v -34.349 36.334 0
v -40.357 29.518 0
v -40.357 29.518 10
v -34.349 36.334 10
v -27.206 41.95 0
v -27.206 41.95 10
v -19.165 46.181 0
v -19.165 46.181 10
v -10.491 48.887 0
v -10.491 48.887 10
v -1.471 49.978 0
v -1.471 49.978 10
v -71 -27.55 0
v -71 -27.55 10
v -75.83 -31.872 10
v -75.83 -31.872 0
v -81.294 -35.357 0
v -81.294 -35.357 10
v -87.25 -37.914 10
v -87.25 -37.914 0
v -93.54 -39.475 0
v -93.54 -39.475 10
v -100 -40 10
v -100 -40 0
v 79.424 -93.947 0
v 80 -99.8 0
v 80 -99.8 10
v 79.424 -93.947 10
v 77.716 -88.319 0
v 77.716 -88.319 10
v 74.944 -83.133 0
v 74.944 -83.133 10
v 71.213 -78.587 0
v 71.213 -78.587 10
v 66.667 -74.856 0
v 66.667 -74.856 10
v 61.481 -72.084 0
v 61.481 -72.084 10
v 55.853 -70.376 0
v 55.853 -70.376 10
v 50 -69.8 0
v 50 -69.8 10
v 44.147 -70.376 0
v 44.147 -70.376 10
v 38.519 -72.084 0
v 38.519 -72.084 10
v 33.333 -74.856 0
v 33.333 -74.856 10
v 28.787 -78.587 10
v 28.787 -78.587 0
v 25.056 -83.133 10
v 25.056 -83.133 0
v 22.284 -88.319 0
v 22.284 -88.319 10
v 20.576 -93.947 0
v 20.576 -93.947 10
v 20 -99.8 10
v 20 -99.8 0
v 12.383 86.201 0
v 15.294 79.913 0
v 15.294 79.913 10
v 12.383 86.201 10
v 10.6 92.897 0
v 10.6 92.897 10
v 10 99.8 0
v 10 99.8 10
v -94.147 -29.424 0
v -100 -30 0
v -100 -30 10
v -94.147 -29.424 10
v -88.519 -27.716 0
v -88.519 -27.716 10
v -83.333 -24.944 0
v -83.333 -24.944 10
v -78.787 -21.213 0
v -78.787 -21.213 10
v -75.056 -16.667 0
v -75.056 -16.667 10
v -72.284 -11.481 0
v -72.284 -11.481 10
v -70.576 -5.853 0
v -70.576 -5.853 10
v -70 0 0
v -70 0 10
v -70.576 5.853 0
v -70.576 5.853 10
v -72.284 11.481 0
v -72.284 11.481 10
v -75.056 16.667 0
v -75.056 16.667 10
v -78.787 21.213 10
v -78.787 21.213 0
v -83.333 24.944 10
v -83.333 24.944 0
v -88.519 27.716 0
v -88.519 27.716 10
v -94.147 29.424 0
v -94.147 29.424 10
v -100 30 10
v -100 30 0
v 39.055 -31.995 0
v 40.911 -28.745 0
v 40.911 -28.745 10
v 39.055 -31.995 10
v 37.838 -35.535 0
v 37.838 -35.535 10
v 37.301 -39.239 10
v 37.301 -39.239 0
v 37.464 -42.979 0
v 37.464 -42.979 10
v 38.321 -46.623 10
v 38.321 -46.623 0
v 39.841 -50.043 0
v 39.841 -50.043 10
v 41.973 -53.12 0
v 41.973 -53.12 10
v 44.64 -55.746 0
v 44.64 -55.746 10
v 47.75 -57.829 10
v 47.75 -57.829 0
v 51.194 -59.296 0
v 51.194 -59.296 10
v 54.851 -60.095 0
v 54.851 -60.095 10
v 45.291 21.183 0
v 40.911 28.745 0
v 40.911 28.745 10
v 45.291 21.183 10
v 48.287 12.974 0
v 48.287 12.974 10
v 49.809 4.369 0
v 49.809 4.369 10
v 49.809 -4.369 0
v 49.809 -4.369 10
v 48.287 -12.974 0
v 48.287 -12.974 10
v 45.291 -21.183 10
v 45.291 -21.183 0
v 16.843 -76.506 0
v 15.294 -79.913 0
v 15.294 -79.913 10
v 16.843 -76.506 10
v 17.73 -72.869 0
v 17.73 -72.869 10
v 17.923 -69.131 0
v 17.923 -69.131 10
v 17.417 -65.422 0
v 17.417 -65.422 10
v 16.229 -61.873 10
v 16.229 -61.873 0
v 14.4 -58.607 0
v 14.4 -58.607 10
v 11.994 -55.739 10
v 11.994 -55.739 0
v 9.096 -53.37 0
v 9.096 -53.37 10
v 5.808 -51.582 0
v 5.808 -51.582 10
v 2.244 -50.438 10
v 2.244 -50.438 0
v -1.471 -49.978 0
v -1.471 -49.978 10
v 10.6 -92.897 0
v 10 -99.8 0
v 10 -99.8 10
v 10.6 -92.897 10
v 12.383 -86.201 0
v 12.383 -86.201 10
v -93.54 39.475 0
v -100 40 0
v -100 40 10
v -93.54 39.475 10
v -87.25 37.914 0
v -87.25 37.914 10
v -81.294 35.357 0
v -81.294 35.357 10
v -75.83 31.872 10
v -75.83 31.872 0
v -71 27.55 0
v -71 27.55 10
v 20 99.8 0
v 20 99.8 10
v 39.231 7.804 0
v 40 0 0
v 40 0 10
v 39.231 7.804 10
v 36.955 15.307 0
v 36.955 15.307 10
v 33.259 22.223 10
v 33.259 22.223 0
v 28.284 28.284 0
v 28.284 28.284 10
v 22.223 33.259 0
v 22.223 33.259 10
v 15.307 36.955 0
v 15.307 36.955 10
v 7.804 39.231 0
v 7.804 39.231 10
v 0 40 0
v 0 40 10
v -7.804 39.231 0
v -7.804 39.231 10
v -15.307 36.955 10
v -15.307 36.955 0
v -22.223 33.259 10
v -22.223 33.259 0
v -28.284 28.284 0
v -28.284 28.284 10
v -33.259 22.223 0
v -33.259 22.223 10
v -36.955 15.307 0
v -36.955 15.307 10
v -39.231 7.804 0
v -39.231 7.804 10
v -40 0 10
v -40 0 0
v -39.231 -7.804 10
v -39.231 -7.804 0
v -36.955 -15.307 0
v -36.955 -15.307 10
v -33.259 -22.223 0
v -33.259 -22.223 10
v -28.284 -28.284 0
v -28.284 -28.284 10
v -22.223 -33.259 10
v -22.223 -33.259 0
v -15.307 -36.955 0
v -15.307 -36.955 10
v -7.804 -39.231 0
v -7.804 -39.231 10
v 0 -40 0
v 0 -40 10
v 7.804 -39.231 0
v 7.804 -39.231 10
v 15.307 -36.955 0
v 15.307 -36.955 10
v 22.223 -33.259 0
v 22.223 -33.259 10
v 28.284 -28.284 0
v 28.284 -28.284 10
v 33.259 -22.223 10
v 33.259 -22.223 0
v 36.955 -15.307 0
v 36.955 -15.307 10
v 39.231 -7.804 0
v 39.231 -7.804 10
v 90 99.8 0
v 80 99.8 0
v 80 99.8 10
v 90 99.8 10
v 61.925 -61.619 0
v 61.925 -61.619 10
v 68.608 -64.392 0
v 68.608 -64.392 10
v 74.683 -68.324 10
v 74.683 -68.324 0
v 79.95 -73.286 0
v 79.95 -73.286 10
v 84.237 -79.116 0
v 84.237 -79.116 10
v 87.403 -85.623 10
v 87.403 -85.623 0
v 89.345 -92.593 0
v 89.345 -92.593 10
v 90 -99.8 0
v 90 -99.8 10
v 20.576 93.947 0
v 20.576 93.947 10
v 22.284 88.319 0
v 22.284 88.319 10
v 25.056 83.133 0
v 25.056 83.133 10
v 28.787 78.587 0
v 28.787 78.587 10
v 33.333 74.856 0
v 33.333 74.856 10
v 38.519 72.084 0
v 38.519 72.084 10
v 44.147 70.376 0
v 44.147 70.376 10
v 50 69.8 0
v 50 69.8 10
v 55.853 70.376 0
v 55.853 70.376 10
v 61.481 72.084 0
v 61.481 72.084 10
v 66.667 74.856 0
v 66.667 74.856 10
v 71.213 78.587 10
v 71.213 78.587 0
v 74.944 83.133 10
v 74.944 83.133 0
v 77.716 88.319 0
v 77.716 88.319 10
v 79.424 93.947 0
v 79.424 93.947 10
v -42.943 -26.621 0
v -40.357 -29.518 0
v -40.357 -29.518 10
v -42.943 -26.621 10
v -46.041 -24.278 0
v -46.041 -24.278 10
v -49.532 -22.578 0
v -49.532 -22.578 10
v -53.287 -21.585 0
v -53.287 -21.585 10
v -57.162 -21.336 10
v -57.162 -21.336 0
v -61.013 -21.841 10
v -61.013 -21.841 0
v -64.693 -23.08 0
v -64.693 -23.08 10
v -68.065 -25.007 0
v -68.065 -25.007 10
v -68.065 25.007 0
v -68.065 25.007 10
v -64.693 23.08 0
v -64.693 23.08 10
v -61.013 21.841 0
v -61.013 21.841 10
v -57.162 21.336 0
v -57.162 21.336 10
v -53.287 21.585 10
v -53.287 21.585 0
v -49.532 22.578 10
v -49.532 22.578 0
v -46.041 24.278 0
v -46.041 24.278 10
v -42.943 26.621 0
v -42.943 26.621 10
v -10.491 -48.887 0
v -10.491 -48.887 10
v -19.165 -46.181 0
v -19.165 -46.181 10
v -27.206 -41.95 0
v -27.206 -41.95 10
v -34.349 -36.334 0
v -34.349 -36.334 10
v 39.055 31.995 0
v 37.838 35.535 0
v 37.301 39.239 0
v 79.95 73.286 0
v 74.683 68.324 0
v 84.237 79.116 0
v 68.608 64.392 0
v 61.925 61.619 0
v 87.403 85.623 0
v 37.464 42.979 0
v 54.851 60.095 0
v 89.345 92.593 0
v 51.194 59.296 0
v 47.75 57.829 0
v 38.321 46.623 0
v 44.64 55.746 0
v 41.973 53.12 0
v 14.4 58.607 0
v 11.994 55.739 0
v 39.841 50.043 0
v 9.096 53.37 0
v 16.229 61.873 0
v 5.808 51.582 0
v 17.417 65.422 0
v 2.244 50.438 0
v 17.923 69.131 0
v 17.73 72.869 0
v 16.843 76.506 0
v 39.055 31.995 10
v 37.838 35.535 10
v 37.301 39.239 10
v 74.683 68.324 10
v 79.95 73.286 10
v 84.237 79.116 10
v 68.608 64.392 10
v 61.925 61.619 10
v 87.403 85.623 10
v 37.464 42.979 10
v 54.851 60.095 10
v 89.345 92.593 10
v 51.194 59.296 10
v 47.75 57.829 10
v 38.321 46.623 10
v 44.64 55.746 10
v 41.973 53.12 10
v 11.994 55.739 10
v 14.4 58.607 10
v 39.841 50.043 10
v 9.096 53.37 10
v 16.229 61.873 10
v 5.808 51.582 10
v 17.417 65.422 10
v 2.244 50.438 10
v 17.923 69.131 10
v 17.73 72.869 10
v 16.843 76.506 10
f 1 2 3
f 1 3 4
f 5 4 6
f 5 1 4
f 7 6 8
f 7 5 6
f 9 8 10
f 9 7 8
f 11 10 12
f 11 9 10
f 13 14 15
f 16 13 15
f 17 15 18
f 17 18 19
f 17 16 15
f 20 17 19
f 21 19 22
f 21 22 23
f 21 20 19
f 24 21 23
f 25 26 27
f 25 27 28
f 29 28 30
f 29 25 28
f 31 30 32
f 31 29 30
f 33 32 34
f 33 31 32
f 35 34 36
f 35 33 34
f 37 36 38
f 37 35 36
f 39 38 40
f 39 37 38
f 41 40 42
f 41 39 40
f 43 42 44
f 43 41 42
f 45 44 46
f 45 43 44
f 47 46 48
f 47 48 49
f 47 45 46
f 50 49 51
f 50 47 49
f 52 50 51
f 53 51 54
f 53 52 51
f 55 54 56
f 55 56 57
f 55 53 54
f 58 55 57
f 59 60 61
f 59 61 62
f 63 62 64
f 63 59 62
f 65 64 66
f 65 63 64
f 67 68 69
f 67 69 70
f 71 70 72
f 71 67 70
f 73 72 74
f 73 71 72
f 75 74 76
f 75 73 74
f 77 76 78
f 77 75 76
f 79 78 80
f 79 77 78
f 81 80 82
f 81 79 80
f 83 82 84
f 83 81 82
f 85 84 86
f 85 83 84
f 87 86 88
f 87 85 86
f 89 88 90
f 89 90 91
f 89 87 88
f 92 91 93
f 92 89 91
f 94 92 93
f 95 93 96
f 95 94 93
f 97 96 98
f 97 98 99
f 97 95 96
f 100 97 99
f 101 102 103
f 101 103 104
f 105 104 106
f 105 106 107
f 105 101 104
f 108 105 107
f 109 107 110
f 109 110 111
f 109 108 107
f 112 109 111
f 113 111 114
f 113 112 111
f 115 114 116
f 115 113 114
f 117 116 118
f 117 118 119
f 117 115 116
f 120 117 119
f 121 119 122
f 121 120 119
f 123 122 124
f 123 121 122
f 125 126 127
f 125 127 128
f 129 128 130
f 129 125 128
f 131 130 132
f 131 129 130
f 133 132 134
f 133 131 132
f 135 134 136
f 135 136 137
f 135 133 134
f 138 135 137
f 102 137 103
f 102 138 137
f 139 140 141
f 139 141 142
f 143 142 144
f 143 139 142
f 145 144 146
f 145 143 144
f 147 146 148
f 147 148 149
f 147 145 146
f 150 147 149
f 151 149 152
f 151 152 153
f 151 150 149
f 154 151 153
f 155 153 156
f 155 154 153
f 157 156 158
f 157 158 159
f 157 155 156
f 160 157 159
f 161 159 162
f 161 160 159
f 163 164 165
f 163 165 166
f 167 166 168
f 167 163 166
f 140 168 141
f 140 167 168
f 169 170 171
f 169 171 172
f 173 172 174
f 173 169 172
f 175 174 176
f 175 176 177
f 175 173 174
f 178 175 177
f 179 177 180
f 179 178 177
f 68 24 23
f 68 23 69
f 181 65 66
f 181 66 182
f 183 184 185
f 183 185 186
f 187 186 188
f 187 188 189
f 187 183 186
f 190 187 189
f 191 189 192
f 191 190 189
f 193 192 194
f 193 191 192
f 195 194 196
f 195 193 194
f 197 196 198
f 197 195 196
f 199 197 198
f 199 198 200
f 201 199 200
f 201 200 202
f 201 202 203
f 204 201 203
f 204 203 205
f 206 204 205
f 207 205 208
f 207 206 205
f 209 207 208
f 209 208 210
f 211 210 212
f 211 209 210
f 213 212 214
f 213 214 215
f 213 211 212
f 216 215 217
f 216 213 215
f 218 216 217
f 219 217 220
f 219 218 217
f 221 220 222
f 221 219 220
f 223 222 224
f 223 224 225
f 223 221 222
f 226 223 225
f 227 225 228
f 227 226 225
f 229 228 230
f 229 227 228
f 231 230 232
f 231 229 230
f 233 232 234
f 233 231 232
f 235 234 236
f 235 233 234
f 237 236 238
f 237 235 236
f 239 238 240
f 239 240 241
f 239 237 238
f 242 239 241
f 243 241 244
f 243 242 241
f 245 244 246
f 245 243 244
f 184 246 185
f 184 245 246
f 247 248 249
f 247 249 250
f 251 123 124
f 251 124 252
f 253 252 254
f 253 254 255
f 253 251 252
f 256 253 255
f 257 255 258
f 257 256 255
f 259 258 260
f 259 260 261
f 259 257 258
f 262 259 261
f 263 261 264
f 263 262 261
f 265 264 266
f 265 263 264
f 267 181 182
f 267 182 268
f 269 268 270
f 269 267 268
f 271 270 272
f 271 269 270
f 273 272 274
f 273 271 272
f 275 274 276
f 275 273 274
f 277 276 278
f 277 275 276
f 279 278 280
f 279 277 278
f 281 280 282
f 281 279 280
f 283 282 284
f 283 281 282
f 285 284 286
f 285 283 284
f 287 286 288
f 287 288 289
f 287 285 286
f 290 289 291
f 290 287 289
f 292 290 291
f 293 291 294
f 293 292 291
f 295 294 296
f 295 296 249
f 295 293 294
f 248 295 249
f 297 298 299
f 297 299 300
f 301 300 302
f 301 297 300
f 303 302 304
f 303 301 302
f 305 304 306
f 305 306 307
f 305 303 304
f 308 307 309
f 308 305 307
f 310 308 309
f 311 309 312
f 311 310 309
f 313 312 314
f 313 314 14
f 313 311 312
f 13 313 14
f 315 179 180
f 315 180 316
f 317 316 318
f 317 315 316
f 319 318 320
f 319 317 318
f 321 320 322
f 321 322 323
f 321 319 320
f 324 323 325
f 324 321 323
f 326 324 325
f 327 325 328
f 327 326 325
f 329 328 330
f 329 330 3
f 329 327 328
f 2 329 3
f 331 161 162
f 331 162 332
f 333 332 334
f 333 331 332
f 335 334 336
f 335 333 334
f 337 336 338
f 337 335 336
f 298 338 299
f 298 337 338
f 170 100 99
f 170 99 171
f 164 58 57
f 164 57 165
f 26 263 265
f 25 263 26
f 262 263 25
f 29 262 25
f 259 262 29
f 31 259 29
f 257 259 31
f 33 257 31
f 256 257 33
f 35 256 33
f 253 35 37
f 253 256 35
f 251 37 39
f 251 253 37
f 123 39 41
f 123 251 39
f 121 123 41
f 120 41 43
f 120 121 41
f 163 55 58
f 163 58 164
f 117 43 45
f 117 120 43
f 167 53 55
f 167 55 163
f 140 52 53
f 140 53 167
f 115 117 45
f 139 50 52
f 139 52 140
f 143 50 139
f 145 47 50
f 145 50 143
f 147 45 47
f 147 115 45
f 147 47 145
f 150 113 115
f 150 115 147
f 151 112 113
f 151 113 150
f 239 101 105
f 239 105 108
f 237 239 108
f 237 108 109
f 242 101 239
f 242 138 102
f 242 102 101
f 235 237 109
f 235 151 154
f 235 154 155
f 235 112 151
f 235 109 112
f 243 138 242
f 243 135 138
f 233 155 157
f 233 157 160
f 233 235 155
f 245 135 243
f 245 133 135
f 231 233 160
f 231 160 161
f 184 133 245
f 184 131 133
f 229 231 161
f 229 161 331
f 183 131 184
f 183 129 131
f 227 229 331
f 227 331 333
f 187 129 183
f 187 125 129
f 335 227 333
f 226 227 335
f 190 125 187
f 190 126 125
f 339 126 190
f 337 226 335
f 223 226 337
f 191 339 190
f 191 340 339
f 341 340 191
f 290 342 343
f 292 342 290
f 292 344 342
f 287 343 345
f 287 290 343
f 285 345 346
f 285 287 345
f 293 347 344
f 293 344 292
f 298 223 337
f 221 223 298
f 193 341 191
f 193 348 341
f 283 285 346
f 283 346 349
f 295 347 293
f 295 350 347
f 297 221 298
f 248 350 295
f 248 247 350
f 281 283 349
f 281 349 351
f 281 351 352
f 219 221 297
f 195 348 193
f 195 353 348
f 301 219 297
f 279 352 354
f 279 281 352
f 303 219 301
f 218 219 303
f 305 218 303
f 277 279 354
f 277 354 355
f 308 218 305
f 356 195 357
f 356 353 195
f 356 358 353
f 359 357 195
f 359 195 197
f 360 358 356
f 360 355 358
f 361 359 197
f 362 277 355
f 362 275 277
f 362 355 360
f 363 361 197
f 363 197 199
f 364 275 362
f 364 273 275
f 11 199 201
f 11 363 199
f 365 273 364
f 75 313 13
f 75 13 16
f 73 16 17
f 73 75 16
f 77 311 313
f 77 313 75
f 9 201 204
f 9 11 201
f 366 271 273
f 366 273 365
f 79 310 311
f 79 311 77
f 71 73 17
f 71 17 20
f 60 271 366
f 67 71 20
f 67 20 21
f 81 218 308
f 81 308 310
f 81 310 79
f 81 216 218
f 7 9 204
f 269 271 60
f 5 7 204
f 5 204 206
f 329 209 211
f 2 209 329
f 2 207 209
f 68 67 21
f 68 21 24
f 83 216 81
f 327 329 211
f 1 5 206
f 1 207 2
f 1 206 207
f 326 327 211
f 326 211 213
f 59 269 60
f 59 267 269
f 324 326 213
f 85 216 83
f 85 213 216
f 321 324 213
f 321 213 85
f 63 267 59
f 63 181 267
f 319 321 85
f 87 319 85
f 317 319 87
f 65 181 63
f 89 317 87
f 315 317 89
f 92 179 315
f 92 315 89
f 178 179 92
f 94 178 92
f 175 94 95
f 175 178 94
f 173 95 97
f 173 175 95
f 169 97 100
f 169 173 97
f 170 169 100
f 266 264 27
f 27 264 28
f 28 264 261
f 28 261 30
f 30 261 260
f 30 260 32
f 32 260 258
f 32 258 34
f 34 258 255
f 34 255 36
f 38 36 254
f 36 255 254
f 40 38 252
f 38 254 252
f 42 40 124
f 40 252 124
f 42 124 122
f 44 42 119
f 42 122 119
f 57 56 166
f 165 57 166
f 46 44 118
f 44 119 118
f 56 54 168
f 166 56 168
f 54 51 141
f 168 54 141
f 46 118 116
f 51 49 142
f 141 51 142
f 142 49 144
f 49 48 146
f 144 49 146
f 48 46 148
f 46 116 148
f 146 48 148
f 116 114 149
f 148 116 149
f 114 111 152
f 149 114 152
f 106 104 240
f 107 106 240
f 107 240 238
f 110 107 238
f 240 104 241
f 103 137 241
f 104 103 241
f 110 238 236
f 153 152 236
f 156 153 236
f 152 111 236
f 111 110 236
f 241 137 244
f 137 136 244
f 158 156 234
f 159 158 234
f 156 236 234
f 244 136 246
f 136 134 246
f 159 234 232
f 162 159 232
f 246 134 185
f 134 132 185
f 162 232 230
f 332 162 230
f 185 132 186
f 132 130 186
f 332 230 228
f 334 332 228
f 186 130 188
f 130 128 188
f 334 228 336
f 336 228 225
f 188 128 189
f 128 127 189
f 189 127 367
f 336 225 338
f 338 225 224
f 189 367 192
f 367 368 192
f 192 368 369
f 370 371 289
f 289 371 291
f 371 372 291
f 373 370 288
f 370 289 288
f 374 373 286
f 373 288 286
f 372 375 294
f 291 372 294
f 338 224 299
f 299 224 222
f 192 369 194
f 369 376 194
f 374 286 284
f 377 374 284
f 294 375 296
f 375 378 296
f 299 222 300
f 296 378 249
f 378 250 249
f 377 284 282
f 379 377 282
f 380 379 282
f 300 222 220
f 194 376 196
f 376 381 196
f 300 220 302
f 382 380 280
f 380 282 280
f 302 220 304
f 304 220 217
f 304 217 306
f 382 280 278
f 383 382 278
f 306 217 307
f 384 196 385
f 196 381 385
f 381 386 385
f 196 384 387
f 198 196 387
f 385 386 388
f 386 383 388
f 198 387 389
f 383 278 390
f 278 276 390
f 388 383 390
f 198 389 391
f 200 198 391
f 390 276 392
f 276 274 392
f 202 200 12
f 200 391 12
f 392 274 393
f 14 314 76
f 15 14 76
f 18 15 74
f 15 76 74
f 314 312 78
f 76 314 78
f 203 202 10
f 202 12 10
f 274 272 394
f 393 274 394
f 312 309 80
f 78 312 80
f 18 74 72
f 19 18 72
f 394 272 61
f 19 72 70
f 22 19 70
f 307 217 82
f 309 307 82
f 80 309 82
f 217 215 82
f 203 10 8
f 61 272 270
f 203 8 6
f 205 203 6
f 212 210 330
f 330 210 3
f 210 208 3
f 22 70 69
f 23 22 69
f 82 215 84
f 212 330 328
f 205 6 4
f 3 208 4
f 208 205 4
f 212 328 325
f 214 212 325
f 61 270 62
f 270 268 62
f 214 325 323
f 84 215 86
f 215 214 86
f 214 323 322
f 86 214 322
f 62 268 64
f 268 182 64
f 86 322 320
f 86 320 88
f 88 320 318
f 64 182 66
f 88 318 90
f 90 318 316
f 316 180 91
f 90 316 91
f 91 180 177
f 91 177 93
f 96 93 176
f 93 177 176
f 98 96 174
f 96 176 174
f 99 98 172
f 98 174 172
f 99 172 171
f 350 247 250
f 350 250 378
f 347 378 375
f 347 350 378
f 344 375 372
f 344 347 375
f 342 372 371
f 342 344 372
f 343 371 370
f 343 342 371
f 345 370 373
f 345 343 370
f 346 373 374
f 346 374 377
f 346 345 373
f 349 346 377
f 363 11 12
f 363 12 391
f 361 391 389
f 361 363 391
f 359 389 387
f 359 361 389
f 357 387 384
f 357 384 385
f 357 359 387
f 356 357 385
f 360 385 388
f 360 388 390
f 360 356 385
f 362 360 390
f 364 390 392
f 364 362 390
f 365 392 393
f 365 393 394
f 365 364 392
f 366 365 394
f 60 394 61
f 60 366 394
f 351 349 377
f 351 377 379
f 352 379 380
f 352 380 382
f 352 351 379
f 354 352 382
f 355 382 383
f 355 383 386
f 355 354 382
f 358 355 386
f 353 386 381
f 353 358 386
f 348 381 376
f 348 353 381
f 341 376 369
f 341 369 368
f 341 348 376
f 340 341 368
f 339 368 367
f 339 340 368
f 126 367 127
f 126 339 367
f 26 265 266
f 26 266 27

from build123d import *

# Parameters (mm, degrees)
SKETCH2_R           = 40
BOSS_EXTRUDE1_DEPTH = 10


with BuildPart() as part:
    # Sketch2 → Boss-Extrude1 (new body)
    with BuildSketch(Plane.XY):
        with BuildLine():
            Line((-100, -40), (-100, -30))
            ThreePointArc((-100, -30), (-70, 0), (-100, 30))
            Line((-100, 30), (-100, 40))
            ThreePointArc((-100, 40), (-84.220237409, 36.755939555), (-71, 27.549954628))
            ThreePointArc((-71, 27.549954628), (-55.218260111, 21.366045629), (-40.357142857, 29.51780853))
            ThreePointArc((-40.357142857, 29.51780853), (-23.282031855, 44.248694813), (-1.47081146, 49.978362455))
            ThreePointArc((-1.47081146, 49.978362455), (15.390674553, 60.197087002), (15.293909304, 79.913138291))
            ThreePointArc((15.293909304, 79.913138291), (11.346128086, 89.510287366), (10, 99.8))
            Line((10, 99.8), (20, 99.8))
            ThreePointArc((20, 99.8), (50, 69.8), (80, 99.8))
            Line((80, 99.8), (90, 99.8))
            ThreePointArc((90, 99.8), (79.950139168, 73.286057181), (54.85054181, 60.095186134))
            ThreePointArc((54.85054181, 60.095186134), (39.000828287, 48.368352667), (40.911294797, 28.744842286))
            ThreePointArc((40.911294797, 28.744842286), (50, 0), (40.911294797, -28.744842286))
            ThreePointArc((40.911294797, -28.744842286), (39.000828287, -48.368352667), (54.85054181, -60.095186134))
            ThreePointArc((54.85054181, -60.095186134), (79.950139168, -73.286057181), (90, -99.8))
            Line((90, -99.8), (80, -99.8))
            ThreePointArc((80, -99.8), (50, -69.8), (20, -99.8))
            Line((20, -99.8), (10, -99.8))
            ThreePointArc((10, -99.8), (11.346128086, -89.510287366), (15.293909304, -79.913138291))
            ThreePointArc((15.293909304, -79.913138291), (15.390674553, -60.197087002), (-1.47081146, -49.978362455))
            ThreePointArc((-1.47081146, -49.978362455), (-23.282031855, -44.248694813), (-40.357142857, -29.51780853))
            ThreePointArc((-40.357142857, -29.51780853), (-55.218260111, -21.366045629), (-71, -27.549954628))
            ThreePointArc((-71, -27.549954628), (-84.220237409, -36.755939555), (-100, -40))
        make_face()
        Circle(SKETCH2_R, mode=Mode.SUBTRACT)
    extrude(amount=BOSS_EXTRUDE1_DEPTH)


solid = part.part
